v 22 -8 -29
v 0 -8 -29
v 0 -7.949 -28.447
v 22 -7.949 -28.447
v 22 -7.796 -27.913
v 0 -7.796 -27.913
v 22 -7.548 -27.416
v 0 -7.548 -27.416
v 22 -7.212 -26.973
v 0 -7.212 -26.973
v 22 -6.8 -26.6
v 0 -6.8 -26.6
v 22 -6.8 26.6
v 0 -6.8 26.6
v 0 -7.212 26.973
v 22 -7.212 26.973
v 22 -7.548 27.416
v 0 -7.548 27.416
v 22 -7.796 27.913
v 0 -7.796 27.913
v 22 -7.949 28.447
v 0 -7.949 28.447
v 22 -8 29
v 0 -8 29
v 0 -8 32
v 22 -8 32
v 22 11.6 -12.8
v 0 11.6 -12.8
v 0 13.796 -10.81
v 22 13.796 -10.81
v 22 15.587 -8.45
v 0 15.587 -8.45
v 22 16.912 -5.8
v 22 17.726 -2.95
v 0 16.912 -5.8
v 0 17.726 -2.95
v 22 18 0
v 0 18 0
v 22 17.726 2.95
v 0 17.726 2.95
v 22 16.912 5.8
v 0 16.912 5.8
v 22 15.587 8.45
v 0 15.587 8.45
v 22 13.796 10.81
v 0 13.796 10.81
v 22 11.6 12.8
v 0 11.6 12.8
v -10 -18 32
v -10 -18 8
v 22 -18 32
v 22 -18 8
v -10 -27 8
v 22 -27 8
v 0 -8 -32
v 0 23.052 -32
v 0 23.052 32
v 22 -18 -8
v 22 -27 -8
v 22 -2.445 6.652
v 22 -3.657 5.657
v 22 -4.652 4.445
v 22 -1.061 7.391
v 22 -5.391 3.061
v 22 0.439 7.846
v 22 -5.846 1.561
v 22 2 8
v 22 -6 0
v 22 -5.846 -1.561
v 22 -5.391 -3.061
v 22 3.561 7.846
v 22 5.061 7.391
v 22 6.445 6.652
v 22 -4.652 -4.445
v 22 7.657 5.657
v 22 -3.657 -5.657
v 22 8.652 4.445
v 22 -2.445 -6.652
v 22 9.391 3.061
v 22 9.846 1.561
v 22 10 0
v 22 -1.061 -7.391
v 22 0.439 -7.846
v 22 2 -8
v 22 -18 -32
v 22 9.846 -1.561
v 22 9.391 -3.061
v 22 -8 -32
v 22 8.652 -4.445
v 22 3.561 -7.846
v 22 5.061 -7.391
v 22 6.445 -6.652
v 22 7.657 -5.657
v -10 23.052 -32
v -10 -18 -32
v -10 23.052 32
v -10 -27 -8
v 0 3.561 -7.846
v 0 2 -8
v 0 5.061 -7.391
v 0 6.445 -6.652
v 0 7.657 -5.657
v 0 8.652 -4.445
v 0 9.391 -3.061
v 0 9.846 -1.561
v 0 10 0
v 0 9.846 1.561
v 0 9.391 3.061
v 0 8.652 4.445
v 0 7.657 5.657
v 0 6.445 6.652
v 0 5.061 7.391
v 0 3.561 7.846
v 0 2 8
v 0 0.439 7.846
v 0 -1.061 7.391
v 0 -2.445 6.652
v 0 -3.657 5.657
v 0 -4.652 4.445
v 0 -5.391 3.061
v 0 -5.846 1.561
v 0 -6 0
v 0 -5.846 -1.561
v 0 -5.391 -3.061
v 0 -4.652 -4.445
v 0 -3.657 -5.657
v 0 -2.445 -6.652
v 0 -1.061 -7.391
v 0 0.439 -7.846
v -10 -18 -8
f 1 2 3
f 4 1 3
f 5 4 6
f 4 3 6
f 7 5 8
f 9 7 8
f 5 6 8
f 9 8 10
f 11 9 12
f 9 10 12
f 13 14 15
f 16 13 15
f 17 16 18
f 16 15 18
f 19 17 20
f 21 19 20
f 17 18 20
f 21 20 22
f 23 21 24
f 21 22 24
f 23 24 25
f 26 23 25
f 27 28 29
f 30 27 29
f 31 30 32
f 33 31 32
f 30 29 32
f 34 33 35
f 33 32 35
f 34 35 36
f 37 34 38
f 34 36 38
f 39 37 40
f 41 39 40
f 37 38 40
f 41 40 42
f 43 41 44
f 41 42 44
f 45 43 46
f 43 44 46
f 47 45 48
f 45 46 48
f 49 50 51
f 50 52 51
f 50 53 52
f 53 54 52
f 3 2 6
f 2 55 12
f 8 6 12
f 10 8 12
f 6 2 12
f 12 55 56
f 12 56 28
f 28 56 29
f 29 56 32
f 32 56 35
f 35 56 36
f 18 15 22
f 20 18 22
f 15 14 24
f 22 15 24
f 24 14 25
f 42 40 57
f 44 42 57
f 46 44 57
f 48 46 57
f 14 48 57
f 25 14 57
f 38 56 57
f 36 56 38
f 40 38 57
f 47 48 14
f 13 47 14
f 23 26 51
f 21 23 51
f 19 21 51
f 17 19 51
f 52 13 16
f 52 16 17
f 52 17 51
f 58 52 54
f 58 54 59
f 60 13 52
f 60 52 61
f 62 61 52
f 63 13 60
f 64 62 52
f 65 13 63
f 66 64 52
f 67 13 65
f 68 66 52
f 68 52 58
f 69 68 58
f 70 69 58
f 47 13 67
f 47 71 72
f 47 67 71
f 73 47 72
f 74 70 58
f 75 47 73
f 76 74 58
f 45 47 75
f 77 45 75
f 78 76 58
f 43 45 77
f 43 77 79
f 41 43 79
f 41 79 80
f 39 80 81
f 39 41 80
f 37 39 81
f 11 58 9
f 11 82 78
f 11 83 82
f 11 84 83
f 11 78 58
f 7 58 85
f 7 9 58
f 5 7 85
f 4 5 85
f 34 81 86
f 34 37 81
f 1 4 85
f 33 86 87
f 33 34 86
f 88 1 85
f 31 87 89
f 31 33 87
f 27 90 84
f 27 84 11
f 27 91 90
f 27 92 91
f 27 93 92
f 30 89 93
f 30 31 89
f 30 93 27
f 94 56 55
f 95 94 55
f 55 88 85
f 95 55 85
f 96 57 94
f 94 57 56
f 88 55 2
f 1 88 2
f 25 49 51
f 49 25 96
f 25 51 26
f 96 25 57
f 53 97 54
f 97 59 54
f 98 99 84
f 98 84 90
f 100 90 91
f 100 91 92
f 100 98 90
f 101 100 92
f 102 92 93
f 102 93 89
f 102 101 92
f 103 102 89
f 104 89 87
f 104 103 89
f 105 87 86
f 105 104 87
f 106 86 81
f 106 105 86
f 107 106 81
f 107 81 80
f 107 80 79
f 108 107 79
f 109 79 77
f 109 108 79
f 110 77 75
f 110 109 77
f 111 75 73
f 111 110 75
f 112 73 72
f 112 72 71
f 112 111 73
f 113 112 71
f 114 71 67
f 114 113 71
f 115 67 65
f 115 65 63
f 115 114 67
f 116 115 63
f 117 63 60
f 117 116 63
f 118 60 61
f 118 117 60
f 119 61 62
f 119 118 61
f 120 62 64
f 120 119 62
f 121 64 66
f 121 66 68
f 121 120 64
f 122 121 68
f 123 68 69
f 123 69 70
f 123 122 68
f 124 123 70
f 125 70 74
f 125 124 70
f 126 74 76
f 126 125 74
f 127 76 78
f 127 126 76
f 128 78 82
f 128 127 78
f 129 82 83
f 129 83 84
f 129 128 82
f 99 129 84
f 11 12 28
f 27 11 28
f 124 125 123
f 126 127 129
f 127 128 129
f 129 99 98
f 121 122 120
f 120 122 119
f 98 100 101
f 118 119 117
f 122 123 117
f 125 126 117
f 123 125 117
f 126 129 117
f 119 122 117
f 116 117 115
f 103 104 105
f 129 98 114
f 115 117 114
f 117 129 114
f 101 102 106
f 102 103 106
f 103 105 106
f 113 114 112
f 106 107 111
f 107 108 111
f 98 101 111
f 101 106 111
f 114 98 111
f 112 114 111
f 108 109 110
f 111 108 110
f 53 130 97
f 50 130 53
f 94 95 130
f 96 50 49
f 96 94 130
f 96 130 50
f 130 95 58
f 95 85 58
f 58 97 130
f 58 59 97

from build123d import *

# Parameters (mm, degrees)
SKETCH1_R           = 8
BOSS_EXTRUDE2_DEPTH = 22
SKETCH2_R           = 8
SKETCH2_W           = 16
SKETCH2_H           = 9
BOSS_EXTRUDE4_DEPTH = 10


with BuildPart() as part:
    # Sketch1 → Boss-Extrude2 (new body)
    with BuildSketch(Plane(origin=(0, 0, 0), x_dir=(0, 0, -1), z_dir=(1, 0, 0))):
        with BuildLine():
            Line((32, -8), (29, -8))
            ThreePointArc((29, -8), (27.658359214, -7.683281573), (26.6, -6.8))
            Line((26.6, -6.8), (12.8, 11.6))
            ThreePointArc((12.8, 11.6), (0, 18), (-12.8, 11.6))
            Line((-12.8, 11.6), (-26.6, -6.8))
            ThreePointArc((-26.6, -6.8), (-27.658359214, -7.683281573), (-29, -8))
            Line((-29, -8), (-32, -8))
            Line((-32, -8), (-32, -18))
            Line((-32, -18), (-8, -18))
            Line((-8, -18), (-8, -27))
            Line((-8, -27), (8, -27))
            Line((8, -27), (8, -18))
            Line((8, -18), (32, -18))
            Line((32, -18), (32, -8))
        make_face()
        with Locations((0, 2)):
            Circle(SKETCH1_R, mode=Mode.SUBTRACT)
    extrude(amount=BOSS_EXTRUDE2_DEPTH)

    # Sketch2 → Boss-Extrude4 (add)
    with BuildSketch(Plane.ZY):
        with BuildLine():
            Line((-32, 23.051846753), (-32, -8))
            Line((-32, -8), (-29, -8))
            ThreePointArc((-29, -8), (-27.658359214, -7.683281573), (-26.6, -6.8))
            Line((-26.6, -6.8), (-12.8, 11.6))
            ThreePointArc((-12.8, 11.6), (0, 18), (12.8, 11.6))
            Line((12.8, 11.6), (26.6, -6.8))
            ThreePointArc((26.6, -6.8), (27.658359214, -7.683281573), (29, -8))
            Line((29, -8), (32, -8))
            Line((32, -8), (32, 23.051846753))
            Line((32, 23.051846753), (-32, 23.051846753))
        make_face()
        with BuildLine():
            Line((-32, -18), (-8, -18))
            Line((-8, -18), (8, -18))
            Line((8, -18), (32, -18))
            Line((32, -18), (32, -8))
            Line((32, -8), (29, -8))
            ThreePointArc((29, -8), (27.658359214, -7.683281573), (26.6, -6.8))
            Line((26.6, -6.8), (12.8, 11.6))
            ThreePointArc((12.8, 11.6), (0, 18), (-12.8, 11.6))
            Line((-12.8, 11.6), (-26.6, -6.8))
            ThreePointArc((-26.6, -6.8), (-27.658359214, -7.683281573), (-29, -8))
            Line((-29, -8), (-32, -8))
            Line((-32, -8), (-32, -18))
        make_face()
        with Locations((0, 2)):
            Circle(SKETCH2_R, mode=Mode.SUBTRACT)
        with Locations((0, -22.5)):
            Rectangle(SKETCH2_W, SKETCH2_H)
        with Locations((0, 2)):
            Circle(SKETCH2_R)
    extrude(amount=BOSS_EXTRUDE4_DEPTH)


solid = part.part
